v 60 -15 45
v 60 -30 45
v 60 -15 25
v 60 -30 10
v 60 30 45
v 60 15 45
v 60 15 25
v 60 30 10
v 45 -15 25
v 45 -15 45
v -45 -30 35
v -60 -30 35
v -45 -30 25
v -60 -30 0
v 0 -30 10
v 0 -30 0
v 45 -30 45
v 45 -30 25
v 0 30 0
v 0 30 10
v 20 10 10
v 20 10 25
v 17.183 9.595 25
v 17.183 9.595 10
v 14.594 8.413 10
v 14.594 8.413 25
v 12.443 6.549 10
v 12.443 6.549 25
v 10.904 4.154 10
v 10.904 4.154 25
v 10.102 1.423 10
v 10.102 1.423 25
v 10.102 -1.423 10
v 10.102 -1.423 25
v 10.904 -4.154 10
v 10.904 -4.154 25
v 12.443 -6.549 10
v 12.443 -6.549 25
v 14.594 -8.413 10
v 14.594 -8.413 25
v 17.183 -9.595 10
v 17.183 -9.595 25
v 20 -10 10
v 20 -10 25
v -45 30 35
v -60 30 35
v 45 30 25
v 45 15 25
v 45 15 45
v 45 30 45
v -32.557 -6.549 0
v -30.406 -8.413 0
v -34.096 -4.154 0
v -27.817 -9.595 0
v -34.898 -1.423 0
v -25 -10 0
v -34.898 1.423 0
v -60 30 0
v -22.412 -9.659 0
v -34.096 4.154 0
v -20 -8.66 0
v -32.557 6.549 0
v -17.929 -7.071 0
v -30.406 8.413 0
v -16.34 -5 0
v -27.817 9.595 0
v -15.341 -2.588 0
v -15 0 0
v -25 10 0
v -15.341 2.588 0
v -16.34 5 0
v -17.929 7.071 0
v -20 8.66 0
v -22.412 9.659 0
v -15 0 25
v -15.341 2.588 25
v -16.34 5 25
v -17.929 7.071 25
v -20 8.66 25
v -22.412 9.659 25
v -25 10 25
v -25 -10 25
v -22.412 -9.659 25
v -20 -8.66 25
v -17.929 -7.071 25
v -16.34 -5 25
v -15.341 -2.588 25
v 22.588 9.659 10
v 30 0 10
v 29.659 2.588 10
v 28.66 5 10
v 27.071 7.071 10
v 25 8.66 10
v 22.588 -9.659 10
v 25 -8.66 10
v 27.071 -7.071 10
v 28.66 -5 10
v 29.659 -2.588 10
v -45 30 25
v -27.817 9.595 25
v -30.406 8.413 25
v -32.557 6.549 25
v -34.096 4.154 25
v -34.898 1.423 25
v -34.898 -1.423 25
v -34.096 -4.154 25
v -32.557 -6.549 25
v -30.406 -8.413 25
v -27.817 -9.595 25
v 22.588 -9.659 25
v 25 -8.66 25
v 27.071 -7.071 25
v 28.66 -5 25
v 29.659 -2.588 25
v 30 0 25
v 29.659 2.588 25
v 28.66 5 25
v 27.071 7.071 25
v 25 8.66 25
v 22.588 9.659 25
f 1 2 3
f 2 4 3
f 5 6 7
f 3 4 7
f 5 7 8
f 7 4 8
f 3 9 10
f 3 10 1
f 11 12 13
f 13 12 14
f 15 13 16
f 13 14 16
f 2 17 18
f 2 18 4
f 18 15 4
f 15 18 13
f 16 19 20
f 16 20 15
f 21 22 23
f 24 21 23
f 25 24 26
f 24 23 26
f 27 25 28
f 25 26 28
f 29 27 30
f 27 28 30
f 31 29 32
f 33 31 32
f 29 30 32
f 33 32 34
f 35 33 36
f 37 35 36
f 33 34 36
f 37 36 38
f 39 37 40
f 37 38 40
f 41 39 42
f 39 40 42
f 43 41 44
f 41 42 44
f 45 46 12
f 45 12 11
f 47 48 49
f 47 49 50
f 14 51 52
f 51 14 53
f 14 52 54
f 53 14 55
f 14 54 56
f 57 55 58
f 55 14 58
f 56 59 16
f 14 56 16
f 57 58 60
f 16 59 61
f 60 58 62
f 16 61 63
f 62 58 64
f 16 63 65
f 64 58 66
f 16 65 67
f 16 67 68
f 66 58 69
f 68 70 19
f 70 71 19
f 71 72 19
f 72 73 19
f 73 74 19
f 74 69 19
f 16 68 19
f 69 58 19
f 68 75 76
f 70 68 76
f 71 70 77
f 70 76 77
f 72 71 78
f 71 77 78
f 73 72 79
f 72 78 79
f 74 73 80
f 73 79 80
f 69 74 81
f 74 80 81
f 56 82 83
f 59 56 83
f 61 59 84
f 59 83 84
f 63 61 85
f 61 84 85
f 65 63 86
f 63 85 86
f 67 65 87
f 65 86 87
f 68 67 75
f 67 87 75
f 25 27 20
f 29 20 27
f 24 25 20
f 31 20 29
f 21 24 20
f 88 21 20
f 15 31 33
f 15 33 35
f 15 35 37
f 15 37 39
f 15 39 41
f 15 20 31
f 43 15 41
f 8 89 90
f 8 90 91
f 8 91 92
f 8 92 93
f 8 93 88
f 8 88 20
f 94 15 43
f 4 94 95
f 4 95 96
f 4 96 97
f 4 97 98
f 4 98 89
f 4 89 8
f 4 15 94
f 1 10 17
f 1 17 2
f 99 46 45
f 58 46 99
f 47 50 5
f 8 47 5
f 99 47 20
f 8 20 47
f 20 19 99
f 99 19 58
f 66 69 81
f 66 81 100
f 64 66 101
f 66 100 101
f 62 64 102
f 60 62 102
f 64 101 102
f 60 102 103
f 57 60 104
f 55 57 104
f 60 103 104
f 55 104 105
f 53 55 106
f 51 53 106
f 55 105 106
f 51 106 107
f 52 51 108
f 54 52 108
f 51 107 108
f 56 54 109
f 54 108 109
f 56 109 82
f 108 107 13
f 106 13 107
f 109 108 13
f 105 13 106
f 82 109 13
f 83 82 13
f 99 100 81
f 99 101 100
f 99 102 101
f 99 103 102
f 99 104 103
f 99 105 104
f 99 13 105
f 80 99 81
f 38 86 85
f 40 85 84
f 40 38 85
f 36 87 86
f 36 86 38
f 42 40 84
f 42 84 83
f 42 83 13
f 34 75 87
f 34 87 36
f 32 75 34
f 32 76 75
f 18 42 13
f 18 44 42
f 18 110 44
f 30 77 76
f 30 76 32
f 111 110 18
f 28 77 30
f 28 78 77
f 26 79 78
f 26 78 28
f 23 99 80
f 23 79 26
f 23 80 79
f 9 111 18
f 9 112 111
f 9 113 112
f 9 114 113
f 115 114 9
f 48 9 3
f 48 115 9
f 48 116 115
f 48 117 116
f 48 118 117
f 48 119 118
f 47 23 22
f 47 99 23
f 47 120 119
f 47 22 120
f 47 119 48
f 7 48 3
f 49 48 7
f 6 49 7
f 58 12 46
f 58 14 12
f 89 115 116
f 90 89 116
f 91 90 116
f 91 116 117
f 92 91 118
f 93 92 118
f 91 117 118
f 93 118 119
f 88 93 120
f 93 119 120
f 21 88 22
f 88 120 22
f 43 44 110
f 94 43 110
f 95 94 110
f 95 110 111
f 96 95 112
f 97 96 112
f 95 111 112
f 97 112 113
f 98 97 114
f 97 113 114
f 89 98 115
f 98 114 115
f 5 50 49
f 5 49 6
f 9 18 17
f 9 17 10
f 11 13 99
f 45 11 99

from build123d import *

# Parameters (mm, degrees)
F0_W     = 120
F0_H     = 60
F1_DEPTH = 25
F2_W     = 60
F2_H     = 60
F3_DEPTH = 10
F4_W     = 15
F4_H     = 60
F5_DEPTH = 10
F6_W     = 15
F6_H     = 15
F7_DEPTH = 20
F9_DEPTH = 25.001


with BuildPart() as f1:
    # F0 (on Top) → F1 (new body)
    with BuildSketch(Plane.XY):
        Rectangle(F0_W, F0_H)
    extrude(amount=F1_DEPTH)

    # F2 (on face) → F3 (cut)
    with BuildSketch(Plane(origin=(0, 0, 0), x_dir=(1, 0, 0), z_dir=(0, 0, -1))):
        with Locations((30, 0)):
            Rectangle(F2_W, F2_H)
    extrude(amount=-F3_DEPTH, mode=Mode.SUBTRACT)

    # F4 (on face) → F5 (join)
    with BuildSketch(Plane.XY.offset(25)):
        with Locations((-52.5, 0)):
            Rectangle(F4_W, F4_H)
    extrude(amount=F5_DEPTH)

    # F6 (on face) → F7 (join)
    with BuildSketch(Plane.XY.offset(25)):
        with Locations((52.5, -22.5)):
            Rectangle(F6_W, F6_H)
        with Locations((52.5, 22.5)):
            Rectangle(F6_W, F6_H)
    extrude(amount=F7_DEPTH)

    # F8 (on face) → F9 (cut, through all)
    with BuildSketch(Plane.XY.offset(25)):
        with BuildLine():
            Line((-25, 10), (-25, -10))
            ThreePointArc((-25, -10), (-17.9289321881, -7.0710678119), (-15, 0))
            ThreePointArc((-15, 0), (-17.9289321881, 7.0710678119), (-25, 10))
        make_face()
        with BuildLine():
            ThreePointArc((-25, 10), (-35, 0), (-25, -10))
            Line((-25, -10), (-25, 10))
        make_face()
        with BuildLine():
            ThreePointArc((20, 10), (10, 0), (20, -10))
            Line((20, -10), (20, 10))
        make_face()
        with BuildLine():
            Line((20, 10), (20, -10))
            ThreePointArc((20, -10), (27.0710678119, -7.0710678119), (30, 0))
            ThreePointArc((30, 0), (27.0710678119, 7.0710678119), (20, 10))
        make_face()
    extrude(amount=-F9_DEPTH, mode=Mode.SUBTRACT)


solid = f1.part
